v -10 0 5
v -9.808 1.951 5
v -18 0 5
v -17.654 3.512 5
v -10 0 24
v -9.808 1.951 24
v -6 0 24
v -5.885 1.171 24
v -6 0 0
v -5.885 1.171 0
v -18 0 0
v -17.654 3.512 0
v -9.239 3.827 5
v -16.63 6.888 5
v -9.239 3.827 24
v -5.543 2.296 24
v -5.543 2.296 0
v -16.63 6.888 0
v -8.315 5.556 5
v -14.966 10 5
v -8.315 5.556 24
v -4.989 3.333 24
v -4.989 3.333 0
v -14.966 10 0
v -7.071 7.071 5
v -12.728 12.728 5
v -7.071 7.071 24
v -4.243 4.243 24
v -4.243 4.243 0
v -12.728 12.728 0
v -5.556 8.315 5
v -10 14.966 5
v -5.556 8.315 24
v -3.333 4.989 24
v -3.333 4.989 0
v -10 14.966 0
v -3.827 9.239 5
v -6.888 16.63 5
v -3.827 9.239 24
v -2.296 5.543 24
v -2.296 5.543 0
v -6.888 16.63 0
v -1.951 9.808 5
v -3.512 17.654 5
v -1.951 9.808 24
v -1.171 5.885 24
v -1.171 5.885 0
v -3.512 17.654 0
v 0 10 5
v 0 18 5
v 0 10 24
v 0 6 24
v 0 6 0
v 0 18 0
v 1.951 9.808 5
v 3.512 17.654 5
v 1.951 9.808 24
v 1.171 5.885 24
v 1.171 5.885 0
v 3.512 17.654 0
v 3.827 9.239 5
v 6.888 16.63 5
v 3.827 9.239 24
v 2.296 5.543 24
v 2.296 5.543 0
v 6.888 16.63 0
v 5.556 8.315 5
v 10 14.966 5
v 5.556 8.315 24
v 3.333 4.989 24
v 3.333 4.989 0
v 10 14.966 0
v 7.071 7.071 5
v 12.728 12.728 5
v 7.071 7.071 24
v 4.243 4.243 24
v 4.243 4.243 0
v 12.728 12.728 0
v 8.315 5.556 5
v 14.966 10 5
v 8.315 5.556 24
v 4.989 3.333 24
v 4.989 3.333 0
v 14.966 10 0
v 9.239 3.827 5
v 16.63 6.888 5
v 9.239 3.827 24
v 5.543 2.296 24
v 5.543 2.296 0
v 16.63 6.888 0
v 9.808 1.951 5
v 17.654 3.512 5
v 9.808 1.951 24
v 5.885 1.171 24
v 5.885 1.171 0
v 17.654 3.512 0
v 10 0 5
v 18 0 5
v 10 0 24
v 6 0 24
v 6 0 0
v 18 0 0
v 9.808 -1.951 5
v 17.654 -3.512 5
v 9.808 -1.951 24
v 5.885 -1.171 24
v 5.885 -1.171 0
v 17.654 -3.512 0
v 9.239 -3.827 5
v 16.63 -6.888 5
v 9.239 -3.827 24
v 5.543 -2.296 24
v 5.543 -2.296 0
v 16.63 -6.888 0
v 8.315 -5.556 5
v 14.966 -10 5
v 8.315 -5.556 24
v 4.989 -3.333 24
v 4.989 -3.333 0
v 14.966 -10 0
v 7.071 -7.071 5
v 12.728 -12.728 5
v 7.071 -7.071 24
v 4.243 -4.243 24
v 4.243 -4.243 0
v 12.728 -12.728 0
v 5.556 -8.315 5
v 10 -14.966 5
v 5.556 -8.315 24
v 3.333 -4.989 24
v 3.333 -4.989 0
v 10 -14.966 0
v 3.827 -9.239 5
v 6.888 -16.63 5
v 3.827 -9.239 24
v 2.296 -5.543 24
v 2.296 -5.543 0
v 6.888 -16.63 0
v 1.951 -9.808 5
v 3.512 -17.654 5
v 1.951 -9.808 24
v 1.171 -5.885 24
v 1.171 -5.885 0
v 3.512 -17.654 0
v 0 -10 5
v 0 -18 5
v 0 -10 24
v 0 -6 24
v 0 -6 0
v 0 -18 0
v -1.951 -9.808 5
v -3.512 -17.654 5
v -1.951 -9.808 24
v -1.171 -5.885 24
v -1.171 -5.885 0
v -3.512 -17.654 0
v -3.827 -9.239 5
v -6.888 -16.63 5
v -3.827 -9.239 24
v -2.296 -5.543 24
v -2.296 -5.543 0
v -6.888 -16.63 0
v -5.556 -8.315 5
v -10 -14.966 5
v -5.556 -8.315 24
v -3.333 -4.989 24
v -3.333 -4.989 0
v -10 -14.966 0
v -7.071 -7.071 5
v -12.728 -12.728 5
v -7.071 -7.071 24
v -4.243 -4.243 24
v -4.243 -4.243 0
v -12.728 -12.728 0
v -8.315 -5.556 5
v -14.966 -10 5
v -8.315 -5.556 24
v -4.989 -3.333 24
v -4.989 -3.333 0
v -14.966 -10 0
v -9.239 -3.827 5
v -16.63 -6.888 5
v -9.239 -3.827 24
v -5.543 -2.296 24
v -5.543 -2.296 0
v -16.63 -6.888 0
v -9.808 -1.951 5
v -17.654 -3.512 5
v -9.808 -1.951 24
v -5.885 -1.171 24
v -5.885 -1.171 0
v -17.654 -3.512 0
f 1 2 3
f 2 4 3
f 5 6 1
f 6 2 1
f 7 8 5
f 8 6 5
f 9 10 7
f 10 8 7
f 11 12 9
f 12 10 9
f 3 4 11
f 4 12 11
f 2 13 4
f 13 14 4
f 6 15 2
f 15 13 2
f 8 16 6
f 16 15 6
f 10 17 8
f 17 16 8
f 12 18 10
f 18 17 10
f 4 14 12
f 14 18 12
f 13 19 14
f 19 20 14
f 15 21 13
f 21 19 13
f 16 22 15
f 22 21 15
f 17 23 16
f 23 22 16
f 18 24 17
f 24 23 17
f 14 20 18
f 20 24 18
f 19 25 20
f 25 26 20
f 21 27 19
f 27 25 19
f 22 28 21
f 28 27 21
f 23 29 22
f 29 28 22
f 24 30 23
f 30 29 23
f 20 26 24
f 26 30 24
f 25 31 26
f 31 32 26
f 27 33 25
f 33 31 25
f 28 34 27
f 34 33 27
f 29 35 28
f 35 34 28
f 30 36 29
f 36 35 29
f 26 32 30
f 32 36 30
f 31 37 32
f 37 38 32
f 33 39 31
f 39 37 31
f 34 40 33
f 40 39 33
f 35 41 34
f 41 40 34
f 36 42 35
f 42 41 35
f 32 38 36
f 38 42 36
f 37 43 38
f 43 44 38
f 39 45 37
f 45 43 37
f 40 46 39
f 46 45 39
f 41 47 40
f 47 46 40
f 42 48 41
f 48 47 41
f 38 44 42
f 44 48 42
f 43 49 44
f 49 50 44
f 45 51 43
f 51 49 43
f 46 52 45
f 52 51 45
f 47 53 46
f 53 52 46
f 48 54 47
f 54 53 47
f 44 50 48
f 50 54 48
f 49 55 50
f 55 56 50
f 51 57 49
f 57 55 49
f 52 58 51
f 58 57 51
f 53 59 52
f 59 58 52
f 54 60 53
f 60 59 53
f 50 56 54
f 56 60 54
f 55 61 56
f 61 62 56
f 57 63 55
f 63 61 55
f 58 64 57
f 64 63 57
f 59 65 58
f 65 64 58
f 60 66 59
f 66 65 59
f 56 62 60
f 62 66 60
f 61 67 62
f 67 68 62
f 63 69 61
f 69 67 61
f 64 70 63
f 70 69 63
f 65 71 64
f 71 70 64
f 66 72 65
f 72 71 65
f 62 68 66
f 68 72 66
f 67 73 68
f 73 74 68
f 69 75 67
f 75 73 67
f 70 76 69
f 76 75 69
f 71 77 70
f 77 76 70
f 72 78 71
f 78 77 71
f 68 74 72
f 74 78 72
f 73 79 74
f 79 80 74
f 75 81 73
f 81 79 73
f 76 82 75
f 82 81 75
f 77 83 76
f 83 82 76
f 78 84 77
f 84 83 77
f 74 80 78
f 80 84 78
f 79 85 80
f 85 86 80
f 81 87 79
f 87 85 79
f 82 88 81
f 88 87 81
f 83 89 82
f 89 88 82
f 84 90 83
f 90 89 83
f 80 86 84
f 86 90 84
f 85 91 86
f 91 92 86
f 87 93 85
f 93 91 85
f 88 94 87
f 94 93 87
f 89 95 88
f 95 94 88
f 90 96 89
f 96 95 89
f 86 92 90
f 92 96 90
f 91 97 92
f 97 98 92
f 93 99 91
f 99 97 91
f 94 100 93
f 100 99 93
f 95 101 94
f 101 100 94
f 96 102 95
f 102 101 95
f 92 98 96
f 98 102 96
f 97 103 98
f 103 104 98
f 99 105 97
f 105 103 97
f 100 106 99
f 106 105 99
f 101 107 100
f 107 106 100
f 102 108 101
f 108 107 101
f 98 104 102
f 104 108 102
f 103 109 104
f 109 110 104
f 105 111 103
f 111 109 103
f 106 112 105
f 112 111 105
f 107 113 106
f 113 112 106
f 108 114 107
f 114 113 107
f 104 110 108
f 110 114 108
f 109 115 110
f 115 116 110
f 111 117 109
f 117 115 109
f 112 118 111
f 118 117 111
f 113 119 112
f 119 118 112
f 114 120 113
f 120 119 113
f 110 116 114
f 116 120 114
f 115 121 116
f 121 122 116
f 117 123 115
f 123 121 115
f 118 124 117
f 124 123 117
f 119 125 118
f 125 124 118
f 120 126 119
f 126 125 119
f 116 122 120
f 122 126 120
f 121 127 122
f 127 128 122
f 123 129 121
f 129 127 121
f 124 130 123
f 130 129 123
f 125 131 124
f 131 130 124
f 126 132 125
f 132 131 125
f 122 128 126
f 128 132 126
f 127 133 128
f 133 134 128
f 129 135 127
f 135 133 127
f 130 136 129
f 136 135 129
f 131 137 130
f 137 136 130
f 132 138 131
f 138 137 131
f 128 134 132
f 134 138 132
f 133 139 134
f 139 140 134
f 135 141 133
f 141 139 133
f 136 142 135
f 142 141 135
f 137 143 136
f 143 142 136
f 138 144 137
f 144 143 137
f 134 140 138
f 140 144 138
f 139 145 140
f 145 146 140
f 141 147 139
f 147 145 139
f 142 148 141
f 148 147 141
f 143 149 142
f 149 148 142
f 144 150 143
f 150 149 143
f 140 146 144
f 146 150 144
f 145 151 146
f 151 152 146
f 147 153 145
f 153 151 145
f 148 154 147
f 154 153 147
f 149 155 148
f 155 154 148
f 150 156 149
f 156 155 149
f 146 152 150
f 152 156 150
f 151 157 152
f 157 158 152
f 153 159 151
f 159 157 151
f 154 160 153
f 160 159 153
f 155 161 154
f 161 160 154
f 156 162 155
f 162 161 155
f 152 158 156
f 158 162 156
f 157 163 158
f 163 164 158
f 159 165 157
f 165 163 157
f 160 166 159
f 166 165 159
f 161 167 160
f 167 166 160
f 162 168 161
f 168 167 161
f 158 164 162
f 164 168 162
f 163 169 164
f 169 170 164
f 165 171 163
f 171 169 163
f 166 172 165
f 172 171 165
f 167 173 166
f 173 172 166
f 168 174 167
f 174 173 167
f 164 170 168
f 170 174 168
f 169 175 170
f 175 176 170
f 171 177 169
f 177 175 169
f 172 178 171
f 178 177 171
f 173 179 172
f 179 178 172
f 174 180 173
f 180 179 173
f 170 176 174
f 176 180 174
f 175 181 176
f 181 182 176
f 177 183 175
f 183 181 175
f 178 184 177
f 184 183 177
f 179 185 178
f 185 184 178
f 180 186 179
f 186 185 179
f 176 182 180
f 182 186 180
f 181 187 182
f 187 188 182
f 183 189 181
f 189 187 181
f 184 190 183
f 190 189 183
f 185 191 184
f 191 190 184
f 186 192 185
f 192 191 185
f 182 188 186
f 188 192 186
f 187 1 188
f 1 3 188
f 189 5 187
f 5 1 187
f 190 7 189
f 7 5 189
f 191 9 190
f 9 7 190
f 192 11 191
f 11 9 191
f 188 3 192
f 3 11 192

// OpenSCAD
$fn = 32;

// ----------------------------------------------------------------------
// Revolved part: flanged bushing R18
// ----------------------------------------------------------------------

// --- parameters (mm) ---
bore_r = 6;               // bore radius
flange_r = 18;            // flange radius
flange_h = 5;             // flange thickness
sleeve_r = 10;            // sleeve radius
total_h = 24;             // overall height
revolve_angle = 360;      // revolve sweep, degrees

bore_d = 2 * bore_r;
flange_d = 2 * flange_r;
sleeve_d = 2 * sleeve_r;

profile = [[6, 0], [18, 0], [18, 5], [10, 5], [10, 24], [6, 24]];  // primary outline, 6 points, counter clockwise

// --- the one profile operation ---
rotate_extrude(angle = revolve_angle) polygon(points = profile);
